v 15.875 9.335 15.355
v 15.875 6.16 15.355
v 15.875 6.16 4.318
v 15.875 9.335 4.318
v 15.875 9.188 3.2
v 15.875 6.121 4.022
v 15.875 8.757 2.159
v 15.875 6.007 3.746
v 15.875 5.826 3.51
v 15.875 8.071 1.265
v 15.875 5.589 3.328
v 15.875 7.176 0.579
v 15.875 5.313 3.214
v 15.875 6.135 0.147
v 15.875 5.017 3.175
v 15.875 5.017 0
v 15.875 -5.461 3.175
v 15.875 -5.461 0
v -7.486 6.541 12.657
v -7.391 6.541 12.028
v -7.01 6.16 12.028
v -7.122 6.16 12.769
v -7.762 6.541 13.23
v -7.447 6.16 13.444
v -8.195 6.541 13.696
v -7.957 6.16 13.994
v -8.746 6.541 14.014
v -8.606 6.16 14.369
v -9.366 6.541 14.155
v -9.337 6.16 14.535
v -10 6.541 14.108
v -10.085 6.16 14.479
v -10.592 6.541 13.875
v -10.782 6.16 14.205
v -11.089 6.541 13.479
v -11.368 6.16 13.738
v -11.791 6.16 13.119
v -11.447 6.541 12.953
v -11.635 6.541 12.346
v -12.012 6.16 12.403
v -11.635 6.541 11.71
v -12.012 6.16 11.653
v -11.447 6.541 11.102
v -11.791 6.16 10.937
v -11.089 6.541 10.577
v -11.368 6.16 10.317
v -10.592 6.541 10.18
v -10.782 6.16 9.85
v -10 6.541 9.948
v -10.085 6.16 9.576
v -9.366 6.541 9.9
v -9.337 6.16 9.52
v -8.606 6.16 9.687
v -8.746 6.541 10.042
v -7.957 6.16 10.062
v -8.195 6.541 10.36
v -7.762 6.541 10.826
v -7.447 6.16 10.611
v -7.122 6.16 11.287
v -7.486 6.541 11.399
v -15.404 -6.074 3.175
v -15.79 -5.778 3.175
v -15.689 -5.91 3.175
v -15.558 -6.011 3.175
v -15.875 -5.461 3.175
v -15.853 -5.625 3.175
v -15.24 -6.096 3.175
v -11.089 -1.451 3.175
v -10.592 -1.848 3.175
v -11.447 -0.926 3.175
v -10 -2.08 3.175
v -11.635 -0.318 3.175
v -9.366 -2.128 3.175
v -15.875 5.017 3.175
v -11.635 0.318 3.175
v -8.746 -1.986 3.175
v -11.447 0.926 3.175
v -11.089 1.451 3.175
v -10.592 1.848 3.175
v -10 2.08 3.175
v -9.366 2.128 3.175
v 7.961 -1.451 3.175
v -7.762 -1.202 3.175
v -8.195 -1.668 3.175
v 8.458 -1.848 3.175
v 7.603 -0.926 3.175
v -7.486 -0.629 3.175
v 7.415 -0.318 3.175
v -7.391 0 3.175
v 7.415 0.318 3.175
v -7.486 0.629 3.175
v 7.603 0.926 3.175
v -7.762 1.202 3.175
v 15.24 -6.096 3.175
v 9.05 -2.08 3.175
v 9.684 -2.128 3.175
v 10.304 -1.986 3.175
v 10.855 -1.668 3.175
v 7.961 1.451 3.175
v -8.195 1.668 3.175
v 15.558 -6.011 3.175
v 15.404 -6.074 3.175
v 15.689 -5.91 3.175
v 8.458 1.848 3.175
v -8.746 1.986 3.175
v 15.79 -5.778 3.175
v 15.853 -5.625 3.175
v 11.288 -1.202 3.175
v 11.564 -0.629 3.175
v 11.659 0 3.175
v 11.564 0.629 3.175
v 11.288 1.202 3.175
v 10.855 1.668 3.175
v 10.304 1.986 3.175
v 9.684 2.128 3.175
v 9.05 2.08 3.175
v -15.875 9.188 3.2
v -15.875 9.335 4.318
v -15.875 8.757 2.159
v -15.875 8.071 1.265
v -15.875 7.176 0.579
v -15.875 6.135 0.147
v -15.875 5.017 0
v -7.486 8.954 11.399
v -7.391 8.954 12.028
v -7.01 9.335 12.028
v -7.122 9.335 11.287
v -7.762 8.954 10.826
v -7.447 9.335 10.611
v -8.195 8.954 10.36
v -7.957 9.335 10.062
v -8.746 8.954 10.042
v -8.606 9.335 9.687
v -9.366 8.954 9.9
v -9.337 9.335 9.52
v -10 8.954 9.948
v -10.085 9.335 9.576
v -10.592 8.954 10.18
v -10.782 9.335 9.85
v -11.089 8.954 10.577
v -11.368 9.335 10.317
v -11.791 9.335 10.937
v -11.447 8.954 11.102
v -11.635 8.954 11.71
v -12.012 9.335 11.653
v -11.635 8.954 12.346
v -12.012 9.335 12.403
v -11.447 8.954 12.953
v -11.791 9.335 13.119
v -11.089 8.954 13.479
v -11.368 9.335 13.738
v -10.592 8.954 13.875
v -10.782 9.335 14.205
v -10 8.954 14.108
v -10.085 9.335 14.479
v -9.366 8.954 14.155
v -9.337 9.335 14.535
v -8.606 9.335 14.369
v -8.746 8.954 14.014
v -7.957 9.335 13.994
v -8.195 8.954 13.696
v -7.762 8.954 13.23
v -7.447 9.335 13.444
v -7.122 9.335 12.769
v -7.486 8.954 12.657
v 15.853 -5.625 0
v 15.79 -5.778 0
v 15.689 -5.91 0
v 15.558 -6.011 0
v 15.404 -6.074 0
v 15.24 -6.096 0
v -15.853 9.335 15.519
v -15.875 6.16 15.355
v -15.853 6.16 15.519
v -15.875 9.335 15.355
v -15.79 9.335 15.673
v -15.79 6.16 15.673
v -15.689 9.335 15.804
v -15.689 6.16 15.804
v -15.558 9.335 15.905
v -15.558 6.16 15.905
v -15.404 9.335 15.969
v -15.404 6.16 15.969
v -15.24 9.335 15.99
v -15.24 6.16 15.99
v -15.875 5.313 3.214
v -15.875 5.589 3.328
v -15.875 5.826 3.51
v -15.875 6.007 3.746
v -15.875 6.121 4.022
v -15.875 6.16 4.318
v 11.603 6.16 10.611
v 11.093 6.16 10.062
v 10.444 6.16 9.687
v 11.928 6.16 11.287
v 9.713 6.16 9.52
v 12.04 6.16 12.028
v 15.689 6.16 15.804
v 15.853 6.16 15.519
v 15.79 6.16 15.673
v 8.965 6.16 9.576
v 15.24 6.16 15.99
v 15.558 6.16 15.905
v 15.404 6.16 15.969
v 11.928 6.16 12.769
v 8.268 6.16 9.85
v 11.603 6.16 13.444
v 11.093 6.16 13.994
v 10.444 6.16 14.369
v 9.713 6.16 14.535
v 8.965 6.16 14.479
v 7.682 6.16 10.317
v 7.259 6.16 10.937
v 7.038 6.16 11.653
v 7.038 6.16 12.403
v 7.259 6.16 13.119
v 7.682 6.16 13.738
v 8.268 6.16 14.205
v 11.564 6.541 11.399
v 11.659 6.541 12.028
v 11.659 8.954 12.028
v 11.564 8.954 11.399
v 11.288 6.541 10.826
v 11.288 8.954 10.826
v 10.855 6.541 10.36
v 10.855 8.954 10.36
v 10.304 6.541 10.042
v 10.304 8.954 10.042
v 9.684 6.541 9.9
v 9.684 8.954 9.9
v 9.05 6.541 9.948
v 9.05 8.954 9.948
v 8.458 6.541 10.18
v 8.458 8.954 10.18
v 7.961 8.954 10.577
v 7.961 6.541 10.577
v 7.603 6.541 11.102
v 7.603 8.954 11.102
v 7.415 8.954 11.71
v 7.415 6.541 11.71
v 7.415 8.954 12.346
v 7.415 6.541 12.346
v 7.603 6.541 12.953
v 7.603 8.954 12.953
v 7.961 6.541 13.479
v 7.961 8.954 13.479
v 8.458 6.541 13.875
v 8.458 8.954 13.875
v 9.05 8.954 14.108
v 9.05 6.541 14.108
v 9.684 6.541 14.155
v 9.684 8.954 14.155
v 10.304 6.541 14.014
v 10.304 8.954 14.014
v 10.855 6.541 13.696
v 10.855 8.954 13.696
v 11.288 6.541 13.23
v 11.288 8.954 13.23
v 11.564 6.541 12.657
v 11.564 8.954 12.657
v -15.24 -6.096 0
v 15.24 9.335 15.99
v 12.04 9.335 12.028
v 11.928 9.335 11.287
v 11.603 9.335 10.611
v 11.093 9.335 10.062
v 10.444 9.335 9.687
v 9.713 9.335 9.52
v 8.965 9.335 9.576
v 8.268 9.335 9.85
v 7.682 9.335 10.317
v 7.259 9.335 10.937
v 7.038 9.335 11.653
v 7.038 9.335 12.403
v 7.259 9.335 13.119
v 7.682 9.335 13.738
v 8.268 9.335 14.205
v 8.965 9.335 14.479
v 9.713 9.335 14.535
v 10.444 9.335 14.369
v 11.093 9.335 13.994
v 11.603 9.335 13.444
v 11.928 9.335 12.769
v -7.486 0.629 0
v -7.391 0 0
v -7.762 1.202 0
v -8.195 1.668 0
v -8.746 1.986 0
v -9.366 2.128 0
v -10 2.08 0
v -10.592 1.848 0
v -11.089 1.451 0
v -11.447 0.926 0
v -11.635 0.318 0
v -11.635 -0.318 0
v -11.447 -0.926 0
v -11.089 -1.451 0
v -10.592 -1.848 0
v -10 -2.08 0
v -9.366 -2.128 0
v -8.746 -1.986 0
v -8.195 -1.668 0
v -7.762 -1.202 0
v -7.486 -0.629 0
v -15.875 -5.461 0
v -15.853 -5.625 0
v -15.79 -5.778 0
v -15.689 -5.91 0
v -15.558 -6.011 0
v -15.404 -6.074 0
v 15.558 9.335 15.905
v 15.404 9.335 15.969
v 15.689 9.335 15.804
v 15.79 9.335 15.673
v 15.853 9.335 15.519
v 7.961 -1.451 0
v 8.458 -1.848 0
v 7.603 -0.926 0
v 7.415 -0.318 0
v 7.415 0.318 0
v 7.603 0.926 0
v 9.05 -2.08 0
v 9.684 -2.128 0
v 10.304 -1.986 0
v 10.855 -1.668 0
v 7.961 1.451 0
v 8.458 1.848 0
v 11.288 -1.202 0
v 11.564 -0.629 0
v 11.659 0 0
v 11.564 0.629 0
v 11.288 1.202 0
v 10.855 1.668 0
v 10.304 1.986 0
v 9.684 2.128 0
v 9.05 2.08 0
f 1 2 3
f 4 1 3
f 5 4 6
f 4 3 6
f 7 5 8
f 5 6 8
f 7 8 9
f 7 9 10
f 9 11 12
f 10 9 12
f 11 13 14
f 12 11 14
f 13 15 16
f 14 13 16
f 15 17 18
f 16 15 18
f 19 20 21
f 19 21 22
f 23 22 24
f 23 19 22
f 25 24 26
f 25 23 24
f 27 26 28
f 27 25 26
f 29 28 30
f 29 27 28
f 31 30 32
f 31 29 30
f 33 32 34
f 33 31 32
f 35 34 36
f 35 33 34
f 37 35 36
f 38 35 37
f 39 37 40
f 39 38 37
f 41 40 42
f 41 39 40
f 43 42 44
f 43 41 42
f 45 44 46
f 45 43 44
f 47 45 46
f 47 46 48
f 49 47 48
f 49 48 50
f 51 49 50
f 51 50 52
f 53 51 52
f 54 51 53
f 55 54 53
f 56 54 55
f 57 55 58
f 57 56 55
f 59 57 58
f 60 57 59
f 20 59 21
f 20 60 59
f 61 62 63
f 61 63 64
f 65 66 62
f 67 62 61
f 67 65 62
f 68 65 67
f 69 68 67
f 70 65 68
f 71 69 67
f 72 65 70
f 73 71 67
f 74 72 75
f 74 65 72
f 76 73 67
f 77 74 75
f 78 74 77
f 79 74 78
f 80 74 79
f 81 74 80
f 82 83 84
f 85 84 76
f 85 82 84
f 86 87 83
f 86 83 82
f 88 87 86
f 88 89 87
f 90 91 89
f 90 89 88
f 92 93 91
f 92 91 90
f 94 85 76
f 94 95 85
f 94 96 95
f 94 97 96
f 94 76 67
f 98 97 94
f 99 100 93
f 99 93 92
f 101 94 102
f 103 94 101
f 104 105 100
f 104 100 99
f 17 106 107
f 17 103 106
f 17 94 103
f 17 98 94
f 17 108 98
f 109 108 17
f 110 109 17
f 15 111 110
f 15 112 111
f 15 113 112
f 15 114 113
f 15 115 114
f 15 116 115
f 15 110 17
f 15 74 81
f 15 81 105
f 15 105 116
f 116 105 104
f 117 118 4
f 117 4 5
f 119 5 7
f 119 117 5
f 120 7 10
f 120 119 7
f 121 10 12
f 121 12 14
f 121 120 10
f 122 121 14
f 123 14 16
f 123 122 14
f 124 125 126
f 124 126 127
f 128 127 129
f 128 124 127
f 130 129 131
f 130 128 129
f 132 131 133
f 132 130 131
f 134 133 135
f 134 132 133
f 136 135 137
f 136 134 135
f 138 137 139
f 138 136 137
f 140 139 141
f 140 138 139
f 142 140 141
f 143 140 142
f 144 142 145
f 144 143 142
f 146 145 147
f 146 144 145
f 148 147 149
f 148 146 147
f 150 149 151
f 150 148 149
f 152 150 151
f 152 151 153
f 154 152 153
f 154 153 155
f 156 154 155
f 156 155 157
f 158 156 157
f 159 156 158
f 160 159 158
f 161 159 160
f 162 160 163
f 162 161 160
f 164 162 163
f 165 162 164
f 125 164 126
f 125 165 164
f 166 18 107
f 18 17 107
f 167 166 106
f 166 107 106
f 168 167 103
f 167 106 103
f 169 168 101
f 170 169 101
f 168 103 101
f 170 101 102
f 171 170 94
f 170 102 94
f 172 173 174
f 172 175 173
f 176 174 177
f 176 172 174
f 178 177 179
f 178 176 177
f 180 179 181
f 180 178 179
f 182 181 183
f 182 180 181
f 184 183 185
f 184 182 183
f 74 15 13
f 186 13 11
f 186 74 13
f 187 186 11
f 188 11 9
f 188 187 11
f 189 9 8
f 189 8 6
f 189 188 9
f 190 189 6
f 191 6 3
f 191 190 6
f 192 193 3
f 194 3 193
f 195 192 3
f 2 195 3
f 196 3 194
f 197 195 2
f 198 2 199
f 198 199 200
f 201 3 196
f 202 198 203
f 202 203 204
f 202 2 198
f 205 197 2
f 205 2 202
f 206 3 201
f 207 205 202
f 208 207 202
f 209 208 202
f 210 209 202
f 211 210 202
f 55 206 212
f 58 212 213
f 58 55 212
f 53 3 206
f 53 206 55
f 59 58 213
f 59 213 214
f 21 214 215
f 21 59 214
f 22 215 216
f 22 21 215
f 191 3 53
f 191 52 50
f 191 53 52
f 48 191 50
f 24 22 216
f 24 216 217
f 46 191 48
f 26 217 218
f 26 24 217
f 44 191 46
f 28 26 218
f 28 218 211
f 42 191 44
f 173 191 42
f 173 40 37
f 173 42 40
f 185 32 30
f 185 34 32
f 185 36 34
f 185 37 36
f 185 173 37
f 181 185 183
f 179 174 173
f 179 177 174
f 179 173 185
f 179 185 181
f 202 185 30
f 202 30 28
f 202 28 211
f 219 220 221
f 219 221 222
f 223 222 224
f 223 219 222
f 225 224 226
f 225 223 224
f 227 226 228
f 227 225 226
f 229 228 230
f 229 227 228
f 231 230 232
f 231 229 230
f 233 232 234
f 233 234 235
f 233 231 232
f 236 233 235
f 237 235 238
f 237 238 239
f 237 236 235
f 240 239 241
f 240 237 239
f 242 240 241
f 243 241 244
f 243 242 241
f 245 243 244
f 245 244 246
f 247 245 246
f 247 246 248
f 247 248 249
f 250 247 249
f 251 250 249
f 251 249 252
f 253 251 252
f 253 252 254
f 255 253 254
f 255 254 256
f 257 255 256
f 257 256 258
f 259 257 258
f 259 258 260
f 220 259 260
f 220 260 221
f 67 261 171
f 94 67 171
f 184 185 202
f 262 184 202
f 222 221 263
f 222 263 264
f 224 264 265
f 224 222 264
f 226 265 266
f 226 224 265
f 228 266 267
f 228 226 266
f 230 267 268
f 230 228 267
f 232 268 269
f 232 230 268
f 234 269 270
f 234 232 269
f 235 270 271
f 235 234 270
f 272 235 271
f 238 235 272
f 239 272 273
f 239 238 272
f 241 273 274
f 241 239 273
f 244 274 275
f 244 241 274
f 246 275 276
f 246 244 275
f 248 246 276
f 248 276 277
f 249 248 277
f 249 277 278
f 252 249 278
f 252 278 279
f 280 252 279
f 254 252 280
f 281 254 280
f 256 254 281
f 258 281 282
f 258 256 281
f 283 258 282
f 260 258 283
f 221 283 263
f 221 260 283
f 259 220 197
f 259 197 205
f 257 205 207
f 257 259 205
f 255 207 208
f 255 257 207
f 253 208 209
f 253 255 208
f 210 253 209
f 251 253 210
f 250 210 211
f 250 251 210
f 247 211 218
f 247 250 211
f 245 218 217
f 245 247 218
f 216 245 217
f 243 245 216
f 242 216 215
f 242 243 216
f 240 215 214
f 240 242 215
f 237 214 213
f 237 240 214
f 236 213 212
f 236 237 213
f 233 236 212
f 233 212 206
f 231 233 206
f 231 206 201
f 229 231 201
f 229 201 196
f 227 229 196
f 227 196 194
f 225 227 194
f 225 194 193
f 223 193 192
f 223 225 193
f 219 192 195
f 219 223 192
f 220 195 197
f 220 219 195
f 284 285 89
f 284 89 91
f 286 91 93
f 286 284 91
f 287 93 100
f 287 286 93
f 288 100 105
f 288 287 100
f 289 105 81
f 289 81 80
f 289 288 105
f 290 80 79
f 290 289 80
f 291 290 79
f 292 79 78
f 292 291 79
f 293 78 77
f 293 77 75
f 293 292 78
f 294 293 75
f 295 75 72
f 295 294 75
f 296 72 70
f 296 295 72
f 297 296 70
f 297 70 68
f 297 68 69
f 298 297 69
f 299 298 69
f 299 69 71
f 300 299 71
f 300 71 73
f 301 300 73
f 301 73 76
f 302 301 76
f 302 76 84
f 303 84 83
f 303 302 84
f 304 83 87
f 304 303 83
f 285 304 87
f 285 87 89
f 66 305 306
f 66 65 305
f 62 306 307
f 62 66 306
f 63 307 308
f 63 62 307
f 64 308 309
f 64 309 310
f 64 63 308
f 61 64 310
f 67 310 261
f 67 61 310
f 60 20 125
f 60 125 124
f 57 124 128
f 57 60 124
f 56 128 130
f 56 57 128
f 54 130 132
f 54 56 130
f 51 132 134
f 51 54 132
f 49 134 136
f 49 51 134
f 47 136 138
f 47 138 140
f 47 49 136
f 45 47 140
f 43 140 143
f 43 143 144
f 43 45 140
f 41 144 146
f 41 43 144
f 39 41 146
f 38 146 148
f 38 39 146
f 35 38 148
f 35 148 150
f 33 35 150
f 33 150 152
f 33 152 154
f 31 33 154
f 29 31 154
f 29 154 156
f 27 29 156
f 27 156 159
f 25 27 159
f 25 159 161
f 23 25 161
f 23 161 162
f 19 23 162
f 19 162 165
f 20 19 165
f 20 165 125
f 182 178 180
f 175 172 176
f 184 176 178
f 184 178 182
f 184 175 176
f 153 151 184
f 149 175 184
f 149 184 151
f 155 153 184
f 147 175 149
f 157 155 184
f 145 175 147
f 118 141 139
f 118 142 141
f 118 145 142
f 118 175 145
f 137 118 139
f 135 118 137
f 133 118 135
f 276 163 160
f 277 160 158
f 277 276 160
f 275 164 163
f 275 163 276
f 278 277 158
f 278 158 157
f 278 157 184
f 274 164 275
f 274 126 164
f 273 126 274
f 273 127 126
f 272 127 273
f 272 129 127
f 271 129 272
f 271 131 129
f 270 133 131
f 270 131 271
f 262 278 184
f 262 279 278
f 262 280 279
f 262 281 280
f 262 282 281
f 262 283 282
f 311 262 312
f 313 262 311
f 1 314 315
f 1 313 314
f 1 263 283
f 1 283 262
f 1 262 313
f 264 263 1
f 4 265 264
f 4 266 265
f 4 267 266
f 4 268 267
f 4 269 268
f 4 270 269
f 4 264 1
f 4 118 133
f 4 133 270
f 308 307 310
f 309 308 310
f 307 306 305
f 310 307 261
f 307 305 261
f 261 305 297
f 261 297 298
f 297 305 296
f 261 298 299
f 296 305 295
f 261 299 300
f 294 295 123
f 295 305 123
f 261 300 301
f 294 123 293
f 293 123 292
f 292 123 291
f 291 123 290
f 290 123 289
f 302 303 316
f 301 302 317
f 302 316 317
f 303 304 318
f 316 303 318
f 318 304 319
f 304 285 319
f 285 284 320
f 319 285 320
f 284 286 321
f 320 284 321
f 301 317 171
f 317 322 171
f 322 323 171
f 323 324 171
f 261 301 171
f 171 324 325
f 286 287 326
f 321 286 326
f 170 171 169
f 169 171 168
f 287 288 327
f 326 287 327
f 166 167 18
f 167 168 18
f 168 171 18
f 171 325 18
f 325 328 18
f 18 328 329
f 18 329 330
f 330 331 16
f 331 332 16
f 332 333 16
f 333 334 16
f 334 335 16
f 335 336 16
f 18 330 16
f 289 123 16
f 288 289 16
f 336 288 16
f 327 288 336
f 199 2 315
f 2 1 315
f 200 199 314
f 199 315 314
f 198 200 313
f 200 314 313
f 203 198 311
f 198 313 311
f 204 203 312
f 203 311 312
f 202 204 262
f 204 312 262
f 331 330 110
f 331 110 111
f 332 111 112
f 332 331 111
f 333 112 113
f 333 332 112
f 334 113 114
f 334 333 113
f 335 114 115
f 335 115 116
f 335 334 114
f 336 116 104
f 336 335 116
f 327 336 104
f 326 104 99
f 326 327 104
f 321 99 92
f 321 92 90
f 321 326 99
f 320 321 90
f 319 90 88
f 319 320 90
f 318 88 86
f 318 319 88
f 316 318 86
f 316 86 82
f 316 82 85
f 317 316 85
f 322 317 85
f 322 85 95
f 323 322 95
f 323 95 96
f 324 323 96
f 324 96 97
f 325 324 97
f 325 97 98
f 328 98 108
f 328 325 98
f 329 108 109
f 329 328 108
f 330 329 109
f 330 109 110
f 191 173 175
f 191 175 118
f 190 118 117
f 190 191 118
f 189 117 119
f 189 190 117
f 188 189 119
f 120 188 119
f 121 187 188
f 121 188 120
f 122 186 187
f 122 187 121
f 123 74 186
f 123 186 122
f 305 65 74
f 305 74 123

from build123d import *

# Parameters (mm, degrees)
SKETCH1_W                  = 31.75
SKETCH1_H                  = 26.9748
SKETCH1_R                  = 2.1336
BASE_FLANGE1_DEPTH         = 3.175
SKETCHED_START             = 9.335343098
SKETCHED_BEND1_OUTLINE_W   = 31.75
SKETCHED_BEND1_OUTLINE_H   = 3.175
SKETCHED_BEND1_DEPTH       = 11.543456902
SKETCHED_START_2           = 6.160343098
SKETCHED_BEND1_2_OUTLINE_W = 31.75
SKETCHED_BEND1_2_OUTLINE_H = 12.815143098
SKETCHED_BEND1_2_OUTLINE_R = 2.1336
SKETCHED_BEND1_2_DEPTH     = 2.71893284
SKETCHED_START_3           = 5.017343098
SKETCHED_BEND1_3_OUTLINE_W = 31.75
SKETCHED_BEND1_3_OUTLINE_H = 12.815143098
SKETCHED_BEND1_3_OUTLINE_R = 2.1336
SKETCHED_BEND1_3_DEPTH     = 4.318
SKETCHED_START_4           = -15.875
SKETCHED_BEND1_4_DEPTH     = 31.75
CHAMFER1_SIZE              = 0.381
FILLET1_R                  = 0.635


with BuildPart() as part:
    # Base-Flange1: sheet metal written as solids
    # Sketch1 → Base-Flange1 (new body)
    with BuildSketch(Plane.XY):
        with Locations((0, 7.3914)):
            Rectangle(SKETCH1_W, SKETCH1_H)
        with Locations((9.525, 0)):
            Circle(SKETCH1_R, mode=Mode.SUBTRACT)
        with Locations((-9.525, 0)):
            Circle(SKETCH1_R, mode=Mode.SUBTRACT)
        with Locations((9.525, 16.9164)):
            Circle(SKETCH1_R, mode=Mode.SUBTRACT)
        with Locations((-9.525, 16.9164)):
            Circle(SKETCH1_R, mode=Mode.SUBTRACT)
    extrude(amount=BASE_FLANGE1_DEPTH)

    # Sketched Bend1: read off the stored shape, not the designer's step
    # Sketched Bend1 outline → Sketched Bend1 (cut)
    with BuildSketch(Plane(origin=(0, 0, 0), x_dir=(1, 0, 0), z_dir=(0, 1, 0)).offset(SKETCHED_START)):
        with Locations((0, -1.5875)):
            Rectangle(SKETCHED_BEND1_OUTLINE_W, SKETCHED_BEND1_OUTLINE_H)
    extrude(amount=SKETCHED_BEND1_DEPTH, mode=Mode.SUBTRACT)

    # Sketched Bend1 2 outline → Sketched Bend1 2 (add)
    with BuildSketch(Plane(origin=(0, 0, 0), x_dir=(1, 0, 0), z_dir=(0, 1, 0)).offset(SKETCHED_START_2)):
        with Locations((0, -9.582571549)):
            Rectangle(SKETCHED_BEND1_2_OUTLINE_W, SKETCHED_BEND1_2_OUTLINE_H)
        with Locations((-9.525, -12.027743098)):
            Circle(SKETCHED_BEND1_2_OUTLINE_R, mode=Mode.SUBTRACT)
        with Locations((9.525, -12.027743098)):
            Circle(SKETCHED_BEND1_2_OUTLINE_R, mode=Mode.SUBTRACT)
    extrude(amount=SKETCHED_BEND1_2_DEPTH)

    # Sketched Bend1 3 outline → Sketched Bend1 3 (add)
    with BuildSketch(Plane(origin=(0, 0, 0), x_dir=(1, 0, 0), z_dir=(0, 1, 0)).offset(SKETCHED_START_3)):
        with Locations((0, -9.582571549)):
            Rectangle(SKETCHED_BEND1_3_OUTLINE_W, SKETCHED_BEND1_3_OUTLINE_H)
        with Locations((-9.525, -12.027743098)):
            Circle(SKETCHED_BEND1_3_OUTLINE_R, mode=Mode.SUBTRACT)
        with Locations((9.525, -12.027743098)):
            Circle(SKETCHED_BEND1_3_OUTLINE_R, mode=Mode.SUBTRACT)
    extrude(amount=SKETCHED_BEND1_3_DEPTH)

    # Sketched Bend1 4 outline → Sketched Bend1 4 (cut)
    with BuildSketch(Plane.YZ.offset(SKETCHED_START_4)):
        with BuildLine():
            Line((6.160343098, 4.318), (6.160343098, 15.990143098))
            Line((6.160343098, 15.990143098), (5.017343098, 15.990143098))
            Line((5.017343098, 15.990143098), (5.017343098, 3.175))
            ThreePointArc((5.017343098, 3.175), (5.825566149, 3.509776949), (6.160343098, 4.318))
        make_face()
        with BuildLine():
            Line((9.335343098, 0), (9.335343098, 4.318))
            ThreePointArc((9.335343098, 4.318), (8.070630179, 1.264712919), (5.017343098, 0))
            Line((5.017343098, 0), (9.335343098, 0))
        make_face()
    extrude(amount=SKETCHED_BEND1_4_DEPTH, mode=Mode.SUBTRACT)

    # Chamfer1
    chamfer1_edges = [part.edges().sort_by_distance(p)[0] for p in [
        (7.3914, 9.335343098, 12.027743098),
        (7.3914, 6.160343098, 12.027743098),
        (-11.6586, 9.335343098, 12.027743098),
        (-11.6586, 6.160343098, 12.027743098),
    ]]
    chamfer(chamfer1_edges, length=CHAMFER1_SIZE)

    # Fillet1
    fillet1_edges = [part.edges().sort_by_distance(p)[0] for p in [
        (-15.875, -6.096, 1.5875),
        (15.875, -6.096, 1.5875),
        (-15.875, 7.747843098, 15.990143098),
        (15.875, 7.747843098, 15.990143098),
    ]]
    fillet(fillet1_edges, radius=FILLET1_R)


solid = part.part
